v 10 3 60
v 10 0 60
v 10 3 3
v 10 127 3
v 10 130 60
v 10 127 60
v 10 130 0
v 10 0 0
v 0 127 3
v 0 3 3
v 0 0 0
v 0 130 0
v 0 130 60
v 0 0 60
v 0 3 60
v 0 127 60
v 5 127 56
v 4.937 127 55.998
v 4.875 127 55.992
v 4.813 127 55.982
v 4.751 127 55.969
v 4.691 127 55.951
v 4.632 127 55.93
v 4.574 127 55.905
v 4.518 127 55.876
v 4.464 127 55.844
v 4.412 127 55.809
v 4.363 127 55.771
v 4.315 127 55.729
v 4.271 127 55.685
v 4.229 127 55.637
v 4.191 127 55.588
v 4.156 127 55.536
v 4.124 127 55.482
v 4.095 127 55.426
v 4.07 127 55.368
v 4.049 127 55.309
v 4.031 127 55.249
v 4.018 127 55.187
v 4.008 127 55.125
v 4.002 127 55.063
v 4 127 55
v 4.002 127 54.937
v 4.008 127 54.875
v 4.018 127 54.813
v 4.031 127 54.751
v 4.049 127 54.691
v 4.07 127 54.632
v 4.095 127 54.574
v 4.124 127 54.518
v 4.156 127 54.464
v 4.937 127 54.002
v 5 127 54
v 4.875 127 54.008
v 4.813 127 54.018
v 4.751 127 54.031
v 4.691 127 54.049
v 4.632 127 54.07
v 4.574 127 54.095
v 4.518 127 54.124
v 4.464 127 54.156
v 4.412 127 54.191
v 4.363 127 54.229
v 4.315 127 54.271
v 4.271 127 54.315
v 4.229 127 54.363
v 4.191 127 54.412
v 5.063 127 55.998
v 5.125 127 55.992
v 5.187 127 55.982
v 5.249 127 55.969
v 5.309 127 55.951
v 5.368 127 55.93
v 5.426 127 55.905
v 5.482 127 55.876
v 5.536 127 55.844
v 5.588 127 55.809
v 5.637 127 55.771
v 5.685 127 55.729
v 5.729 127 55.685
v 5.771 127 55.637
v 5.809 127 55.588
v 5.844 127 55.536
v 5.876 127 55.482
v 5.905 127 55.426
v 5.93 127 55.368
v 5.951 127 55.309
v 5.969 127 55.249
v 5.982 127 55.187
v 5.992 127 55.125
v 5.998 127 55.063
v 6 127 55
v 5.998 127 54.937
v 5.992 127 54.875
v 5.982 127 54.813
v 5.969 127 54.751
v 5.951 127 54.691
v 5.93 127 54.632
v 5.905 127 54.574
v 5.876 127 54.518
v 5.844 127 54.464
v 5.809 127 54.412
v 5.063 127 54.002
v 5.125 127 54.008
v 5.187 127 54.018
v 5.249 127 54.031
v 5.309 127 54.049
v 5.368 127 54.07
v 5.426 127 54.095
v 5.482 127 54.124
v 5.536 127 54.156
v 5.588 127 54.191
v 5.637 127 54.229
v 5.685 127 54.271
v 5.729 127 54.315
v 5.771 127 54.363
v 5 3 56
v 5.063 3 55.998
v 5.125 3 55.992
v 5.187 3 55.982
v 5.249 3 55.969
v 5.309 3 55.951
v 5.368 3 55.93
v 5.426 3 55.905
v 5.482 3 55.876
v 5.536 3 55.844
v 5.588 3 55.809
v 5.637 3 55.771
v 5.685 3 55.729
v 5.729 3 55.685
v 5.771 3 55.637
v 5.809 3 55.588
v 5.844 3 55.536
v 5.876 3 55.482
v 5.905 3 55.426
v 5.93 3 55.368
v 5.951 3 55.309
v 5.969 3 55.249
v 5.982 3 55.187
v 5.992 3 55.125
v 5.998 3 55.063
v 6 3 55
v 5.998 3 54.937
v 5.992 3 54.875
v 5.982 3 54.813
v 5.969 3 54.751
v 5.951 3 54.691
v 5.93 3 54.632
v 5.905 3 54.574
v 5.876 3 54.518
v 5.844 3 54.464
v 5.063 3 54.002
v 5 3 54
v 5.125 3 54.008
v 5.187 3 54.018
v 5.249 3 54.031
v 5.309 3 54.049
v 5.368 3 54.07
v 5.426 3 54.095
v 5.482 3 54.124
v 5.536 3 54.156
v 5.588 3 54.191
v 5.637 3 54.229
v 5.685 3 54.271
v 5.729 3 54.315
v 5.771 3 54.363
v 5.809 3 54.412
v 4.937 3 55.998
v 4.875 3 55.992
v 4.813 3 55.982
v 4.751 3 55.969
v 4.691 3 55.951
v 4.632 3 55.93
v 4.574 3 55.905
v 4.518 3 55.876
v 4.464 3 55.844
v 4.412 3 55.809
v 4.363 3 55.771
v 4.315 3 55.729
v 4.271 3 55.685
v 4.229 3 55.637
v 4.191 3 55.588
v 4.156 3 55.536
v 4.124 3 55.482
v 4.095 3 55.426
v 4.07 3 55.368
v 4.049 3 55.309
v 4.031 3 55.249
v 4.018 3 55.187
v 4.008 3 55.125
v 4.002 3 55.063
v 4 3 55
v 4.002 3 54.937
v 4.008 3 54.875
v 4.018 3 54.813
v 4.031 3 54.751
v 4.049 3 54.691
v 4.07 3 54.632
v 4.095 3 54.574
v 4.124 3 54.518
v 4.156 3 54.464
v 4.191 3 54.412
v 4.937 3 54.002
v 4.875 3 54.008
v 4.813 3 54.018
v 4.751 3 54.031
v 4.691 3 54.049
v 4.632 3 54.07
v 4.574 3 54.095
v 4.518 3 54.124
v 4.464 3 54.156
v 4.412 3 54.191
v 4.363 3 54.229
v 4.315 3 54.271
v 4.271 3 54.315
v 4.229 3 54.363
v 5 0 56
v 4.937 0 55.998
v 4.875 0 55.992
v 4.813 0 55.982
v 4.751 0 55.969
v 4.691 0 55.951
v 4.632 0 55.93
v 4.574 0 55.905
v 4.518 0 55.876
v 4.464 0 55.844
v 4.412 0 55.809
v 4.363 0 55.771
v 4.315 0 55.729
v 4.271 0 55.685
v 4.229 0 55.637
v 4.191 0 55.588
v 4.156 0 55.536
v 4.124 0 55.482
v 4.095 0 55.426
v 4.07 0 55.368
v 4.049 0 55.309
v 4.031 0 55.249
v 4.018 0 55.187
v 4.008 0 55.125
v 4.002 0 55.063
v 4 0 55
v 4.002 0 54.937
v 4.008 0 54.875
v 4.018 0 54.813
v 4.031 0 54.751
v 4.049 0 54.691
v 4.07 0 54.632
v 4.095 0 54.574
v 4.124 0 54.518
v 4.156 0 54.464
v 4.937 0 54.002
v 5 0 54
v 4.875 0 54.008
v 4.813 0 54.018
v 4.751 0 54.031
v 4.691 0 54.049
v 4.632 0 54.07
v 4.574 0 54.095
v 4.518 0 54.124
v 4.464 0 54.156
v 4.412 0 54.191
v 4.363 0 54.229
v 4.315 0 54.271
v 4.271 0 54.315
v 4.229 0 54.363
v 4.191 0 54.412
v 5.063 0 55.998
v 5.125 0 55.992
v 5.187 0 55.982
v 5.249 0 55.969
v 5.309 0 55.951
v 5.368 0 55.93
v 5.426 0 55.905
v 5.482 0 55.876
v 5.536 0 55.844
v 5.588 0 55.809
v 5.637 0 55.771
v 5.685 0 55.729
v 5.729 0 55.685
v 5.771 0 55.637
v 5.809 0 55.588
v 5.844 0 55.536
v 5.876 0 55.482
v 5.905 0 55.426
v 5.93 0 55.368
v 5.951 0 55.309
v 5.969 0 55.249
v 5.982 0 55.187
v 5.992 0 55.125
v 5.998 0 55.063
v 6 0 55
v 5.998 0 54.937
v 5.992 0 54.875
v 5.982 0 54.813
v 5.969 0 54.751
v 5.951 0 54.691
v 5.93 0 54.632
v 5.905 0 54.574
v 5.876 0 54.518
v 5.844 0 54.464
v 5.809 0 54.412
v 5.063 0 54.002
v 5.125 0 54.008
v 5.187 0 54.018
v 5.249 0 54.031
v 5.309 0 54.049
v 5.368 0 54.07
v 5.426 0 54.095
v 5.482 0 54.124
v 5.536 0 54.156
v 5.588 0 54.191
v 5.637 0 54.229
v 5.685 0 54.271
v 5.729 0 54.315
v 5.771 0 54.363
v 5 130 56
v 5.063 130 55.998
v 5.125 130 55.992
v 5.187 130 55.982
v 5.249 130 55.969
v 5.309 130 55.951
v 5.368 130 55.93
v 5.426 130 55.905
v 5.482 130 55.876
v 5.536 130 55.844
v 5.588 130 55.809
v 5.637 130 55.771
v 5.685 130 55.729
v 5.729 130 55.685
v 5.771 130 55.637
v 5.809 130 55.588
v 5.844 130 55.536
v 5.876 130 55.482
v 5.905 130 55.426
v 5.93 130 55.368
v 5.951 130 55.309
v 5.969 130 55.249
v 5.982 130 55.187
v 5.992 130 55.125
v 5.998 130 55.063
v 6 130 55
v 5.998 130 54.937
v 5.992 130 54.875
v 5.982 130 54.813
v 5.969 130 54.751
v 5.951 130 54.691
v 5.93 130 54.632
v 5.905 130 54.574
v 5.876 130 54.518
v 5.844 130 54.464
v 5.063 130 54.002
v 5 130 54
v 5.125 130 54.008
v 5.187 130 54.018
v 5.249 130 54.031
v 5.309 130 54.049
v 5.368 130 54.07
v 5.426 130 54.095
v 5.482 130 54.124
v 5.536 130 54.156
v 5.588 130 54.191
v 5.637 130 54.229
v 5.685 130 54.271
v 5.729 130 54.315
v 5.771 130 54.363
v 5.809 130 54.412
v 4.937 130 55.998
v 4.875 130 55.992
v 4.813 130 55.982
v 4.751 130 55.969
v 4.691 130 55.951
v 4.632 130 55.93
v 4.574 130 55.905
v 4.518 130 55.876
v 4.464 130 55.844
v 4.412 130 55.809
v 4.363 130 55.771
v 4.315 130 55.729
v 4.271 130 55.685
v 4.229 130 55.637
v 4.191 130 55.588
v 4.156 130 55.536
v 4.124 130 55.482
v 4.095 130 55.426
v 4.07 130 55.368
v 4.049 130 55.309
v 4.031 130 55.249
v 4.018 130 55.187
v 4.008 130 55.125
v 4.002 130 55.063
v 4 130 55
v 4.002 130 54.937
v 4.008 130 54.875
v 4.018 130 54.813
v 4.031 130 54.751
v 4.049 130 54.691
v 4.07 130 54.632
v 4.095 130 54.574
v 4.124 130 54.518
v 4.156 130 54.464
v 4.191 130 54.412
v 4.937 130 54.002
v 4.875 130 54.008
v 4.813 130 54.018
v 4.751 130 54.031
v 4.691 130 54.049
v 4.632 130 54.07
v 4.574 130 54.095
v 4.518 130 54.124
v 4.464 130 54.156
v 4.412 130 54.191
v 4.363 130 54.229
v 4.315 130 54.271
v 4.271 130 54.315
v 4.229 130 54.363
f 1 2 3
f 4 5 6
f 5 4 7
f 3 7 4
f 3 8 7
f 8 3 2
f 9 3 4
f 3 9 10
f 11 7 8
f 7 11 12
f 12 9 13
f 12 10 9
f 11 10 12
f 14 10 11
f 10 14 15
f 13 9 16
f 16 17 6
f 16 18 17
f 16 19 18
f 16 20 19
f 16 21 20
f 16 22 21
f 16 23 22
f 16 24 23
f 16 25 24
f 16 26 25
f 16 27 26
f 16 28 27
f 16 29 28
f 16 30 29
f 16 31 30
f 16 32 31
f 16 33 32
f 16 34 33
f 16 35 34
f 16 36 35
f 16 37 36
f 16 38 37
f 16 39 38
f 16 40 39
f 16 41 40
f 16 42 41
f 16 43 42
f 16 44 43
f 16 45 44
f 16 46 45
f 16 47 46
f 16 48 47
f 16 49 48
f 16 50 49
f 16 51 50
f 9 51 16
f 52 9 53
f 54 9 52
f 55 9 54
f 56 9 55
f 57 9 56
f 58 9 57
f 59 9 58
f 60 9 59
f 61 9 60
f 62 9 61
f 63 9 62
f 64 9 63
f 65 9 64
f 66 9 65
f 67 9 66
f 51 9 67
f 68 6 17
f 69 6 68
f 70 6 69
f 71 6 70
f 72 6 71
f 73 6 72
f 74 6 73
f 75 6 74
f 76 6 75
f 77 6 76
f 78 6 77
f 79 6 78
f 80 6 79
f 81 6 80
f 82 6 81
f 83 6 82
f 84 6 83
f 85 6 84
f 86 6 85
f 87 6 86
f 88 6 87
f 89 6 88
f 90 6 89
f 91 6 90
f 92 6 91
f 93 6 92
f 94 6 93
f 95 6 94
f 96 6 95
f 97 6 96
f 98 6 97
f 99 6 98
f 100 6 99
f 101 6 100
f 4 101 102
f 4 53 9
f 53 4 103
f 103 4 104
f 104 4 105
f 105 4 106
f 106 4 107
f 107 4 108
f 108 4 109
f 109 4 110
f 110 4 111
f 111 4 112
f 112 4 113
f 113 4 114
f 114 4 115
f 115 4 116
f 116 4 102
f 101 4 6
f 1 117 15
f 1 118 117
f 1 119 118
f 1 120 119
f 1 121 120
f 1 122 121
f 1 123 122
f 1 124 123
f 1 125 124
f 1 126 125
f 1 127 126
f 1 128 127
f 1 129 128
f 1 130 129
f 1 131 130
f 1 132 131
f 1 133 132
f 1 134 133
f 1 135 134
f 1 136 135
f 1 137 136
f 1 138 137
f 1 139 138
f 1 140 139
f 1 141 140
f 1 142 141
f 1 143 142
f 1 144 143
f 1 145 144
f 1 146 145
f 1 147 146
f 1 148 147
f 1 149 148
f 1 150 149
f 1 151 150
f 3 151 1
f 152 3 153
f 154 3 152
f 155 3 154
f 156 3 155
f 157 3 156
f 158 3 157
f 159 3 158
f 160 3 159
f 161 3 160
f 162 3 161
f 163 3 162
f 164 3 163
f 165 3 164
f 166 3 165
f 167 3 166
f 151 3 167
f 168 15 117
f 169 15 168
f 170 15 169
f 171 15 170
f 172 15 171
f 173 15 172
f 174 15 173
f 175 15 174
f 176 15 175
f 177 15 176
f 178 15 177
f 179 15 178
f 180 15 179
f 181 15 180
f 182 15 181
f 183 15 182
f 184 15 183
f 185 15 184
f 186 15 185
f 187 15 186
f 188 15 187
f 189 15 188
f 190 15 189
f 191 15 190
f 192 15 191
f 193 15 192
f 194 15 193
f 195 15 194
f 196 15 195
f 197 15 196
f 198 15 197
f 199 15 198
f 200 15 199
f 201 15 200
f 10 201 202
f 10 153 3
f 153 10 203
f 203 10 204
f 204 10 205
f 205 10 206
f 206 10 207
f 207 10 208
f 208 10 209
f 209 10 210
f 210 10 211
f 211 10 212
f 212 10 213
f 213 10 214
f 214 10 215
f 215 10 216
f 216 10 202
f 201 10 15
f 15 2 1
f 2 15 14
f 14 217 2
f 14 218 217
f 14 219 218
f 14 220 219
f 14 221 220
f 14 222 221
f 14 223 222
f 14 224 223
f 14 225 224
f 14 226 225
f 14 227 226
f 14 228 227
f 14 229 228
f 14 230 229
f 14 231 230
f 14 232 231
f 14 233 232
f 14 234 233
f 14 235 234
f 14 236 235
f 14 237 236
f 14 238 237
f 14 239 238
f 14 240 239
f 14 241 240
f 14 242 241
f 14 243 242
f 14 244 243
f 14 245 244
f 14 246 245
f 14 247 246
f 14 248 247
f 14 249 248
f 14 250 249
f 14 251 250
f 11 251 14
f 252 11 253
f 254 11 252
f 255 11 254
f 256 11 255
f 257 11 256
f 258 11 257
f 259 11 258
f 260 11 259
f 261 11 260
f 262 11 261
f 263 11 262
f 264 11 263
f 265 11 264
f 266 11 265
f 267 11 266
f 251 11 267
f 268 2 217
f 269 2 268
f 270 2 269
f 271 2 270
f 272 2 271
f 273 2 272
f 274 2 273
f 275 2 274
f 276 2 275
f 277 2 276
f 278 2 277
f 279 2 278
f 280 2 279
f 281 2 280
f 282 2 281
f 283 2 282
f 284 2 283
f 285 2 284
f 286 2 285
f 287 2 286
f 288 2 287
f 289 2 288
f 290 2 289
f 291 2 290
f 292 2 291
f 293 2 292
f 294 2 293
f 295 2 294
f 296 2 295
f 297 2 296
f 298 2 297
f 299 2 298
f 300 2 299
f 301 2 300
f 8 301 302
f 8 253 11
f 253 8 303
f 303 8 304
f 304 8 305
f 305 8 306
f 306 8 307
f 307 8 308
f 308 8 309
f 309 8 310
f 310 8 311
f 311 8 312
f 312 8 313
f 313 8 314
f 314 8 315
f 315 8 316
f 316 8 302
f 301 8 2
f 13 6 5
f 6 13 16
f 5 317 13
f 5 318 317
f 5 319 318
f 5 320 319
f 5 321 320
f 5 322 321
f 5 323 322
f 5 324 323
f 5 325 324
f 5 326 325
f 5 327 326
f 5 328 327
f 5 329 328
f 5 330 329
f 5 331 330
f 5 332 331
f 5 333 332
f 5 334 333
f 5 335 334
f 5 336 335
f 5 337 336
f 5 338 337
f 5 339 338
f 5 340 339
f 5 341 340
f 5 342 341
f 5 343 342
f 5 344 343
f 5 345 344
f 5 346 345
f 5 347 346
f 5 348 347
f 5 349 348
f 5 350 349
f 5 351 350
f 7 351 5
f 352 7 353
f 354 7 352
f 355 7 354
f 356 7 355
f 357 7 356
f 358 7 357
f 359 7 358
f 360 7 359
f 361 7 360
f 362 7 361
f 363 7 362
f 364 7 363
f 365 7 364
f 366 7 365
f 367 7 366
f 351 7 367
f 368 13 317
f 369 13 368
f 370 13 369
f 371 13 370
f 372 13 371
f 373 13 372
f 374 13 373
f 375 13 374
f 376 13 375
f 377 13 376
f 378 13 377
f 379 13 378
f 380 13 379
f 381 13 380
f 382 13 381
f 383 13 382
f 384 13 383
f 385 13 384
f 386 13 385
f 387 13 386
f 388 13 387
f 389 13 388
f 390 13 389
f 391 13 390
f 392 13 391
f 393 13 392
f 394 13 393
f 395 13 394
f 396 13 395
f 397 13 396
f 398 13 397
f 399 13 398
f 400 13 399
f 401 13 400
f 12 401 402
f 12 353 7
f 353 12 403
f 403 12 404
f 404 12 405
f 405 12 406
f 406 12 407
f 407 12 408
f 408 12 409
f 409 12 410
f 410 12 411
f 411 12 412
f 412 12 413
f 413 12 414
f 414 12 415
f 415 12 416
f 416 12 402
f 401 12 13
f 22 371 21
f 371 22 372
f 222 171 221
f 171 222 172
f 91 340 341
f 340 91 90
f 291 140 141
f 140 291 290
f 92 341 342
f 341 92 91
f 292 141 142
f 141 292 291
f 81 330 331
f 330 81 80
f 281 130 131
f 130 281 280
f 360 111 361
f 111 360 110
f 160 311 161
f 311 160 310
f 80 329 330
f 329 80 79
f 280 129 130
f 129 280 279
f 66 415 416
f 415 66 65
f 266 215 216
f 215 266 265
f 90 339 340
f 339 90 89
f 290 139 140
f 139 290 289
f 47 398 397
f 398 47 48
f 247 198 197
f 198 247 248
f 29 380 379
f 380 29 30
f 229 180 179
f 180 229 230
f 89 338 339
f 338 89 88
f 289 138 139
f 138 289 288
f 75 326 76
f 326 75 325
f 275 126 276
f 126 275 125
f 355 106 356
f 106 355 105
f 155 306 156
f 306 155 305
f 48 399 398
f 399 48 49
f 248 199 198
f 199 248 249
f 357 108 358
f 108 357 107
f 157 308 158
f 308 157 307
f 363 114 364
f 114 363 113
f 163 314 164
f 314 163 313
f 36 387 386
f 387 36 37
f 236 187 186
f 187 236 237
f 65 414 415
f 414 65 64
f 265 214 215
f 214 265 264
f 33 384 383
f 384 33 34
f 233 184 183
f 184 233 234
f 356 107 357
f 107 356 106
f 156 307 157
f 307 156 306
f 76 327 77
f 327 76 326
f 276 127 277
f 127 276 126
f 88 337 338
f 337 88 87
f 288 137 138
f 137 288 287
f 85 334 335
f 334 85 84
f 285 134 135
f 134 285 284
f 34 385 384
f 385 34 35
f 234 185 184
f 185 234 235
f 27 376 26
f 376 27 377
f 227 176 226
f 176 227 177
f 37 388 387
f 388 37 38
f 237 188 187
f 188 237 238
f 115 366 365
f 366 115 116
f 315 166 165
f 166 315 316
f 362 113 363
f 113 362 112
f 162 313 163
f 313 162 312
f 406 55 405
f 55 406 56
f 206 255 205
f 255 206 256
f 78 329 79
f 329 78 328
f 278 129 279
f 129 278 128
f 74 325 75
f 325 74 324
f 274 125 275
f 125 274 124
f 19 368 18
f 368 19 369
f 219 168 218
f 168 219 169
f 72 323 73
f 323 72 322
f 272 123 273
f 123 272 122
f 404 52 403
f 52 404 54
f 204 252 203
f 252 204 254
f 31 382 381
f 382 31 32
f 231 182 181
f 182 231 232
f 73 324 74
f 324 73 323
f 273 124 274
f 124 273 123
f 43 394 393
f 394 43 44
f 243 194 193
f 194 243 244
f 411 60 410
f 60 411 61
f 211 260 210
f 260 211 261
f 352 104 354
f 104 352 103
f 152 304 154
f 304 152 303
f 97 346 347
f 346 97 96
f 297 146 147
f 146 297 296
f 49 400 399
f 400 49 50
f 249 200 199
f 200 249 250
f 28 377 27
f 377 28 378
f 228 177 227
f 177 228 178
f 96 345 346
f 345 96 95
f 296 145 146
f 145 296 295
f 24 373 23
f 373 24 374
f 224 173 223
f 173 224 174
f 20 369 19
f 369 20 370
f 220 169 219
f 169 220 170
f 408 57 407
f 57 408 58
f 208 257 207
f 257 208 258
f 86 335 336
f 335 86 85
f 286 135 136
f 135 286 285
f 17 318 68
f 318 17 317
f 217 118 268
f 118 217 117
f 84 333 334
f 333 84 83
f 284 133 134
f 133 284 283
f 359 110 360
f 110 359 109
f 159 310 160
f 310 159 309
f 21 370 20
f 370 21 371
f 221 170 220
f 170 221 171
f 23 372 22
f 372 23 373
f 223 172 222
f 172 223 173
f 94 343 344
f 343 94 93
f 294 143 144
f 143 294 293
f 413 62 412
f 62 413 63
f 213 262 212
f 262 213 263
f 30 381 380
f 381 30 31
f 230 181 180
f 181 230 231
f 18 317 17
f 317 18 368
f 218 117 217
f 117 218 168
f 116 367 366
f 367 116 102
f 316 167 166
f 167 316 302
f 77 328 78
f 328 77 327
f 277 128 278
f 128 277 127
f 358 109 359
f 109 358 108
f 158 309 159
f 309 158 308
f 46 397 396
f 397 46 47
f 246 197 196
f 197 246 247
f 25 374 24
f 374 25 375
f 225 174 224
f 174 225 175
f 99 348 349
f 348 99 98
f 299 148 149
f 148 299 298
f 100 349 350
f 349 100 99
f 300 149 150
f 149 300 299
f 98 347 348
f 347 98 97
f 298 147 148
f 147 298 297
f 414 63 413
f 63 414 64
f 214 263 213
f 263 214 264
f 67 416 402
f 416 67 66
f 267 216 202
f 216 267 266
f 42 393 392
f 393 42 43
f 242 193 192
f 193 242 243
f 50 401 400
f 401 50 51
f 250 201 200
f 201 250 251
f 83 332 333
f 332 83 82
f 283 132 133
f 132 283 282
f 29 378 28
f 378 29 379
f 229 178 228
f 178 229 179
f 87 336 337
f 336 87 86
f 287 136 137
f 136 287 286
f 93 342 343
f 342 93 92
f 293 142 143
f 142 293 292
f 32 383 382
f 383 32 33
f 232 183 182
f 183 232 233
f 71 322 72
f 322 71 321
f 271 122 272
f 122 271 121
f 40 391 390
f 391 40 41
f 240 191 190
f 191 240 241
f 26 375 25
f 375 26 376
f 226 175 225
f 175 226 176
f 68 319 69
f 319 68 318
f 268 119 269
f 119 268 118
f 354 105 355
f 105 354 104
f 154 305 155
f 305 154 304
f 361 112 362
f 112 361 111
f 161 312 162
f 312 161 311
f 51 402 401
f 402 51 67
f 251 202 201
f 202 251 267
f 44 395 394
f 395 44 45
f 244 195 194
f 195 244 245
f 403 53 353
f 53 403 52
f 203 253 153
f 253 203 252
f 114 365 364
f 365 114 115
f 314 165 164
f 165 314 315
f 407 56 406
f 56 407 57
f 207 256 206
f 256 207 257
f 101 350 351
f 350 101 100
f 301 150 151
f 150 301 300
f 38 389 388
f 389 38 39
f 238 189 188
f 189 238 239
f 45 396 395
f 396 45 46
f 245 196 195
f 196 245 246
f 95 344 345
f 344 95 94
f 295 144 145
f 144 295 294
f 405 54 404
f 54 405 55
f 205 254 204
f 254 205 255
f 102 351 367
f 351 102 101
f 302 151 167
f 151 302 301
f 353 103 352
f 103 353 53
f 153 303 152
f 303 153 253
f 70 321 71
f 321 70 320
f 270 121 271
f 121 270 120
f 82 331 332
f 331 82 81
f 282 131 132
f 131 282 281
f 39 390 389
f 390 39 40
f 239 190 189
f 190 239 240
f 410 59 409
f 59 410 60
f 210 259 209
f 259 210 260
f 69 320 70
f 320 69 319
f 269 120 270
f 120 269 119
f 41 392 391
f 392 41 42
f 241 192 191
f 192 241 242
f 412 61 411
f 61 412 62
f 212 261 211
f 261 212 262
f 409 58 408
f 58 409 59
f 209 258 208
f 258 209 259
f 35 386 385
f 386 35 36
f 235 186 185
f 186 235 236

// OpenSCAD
difference(){
	union(){ 

        translate([0,3,0]){
           cube([10,124,3], center=false);
        }
        translate([0,0,0]){
           cube([10,3,60], center=false);
        }
        translate([0,127,0]){
           cube([10,3,60], center=false);
        }
        

	}
	union() {
        translate([5,200,55]){
            rotate([90,0,0]){
                cylinder(h=220, r=1, $fn=100, center=false);
            }
        }        
	}
}
